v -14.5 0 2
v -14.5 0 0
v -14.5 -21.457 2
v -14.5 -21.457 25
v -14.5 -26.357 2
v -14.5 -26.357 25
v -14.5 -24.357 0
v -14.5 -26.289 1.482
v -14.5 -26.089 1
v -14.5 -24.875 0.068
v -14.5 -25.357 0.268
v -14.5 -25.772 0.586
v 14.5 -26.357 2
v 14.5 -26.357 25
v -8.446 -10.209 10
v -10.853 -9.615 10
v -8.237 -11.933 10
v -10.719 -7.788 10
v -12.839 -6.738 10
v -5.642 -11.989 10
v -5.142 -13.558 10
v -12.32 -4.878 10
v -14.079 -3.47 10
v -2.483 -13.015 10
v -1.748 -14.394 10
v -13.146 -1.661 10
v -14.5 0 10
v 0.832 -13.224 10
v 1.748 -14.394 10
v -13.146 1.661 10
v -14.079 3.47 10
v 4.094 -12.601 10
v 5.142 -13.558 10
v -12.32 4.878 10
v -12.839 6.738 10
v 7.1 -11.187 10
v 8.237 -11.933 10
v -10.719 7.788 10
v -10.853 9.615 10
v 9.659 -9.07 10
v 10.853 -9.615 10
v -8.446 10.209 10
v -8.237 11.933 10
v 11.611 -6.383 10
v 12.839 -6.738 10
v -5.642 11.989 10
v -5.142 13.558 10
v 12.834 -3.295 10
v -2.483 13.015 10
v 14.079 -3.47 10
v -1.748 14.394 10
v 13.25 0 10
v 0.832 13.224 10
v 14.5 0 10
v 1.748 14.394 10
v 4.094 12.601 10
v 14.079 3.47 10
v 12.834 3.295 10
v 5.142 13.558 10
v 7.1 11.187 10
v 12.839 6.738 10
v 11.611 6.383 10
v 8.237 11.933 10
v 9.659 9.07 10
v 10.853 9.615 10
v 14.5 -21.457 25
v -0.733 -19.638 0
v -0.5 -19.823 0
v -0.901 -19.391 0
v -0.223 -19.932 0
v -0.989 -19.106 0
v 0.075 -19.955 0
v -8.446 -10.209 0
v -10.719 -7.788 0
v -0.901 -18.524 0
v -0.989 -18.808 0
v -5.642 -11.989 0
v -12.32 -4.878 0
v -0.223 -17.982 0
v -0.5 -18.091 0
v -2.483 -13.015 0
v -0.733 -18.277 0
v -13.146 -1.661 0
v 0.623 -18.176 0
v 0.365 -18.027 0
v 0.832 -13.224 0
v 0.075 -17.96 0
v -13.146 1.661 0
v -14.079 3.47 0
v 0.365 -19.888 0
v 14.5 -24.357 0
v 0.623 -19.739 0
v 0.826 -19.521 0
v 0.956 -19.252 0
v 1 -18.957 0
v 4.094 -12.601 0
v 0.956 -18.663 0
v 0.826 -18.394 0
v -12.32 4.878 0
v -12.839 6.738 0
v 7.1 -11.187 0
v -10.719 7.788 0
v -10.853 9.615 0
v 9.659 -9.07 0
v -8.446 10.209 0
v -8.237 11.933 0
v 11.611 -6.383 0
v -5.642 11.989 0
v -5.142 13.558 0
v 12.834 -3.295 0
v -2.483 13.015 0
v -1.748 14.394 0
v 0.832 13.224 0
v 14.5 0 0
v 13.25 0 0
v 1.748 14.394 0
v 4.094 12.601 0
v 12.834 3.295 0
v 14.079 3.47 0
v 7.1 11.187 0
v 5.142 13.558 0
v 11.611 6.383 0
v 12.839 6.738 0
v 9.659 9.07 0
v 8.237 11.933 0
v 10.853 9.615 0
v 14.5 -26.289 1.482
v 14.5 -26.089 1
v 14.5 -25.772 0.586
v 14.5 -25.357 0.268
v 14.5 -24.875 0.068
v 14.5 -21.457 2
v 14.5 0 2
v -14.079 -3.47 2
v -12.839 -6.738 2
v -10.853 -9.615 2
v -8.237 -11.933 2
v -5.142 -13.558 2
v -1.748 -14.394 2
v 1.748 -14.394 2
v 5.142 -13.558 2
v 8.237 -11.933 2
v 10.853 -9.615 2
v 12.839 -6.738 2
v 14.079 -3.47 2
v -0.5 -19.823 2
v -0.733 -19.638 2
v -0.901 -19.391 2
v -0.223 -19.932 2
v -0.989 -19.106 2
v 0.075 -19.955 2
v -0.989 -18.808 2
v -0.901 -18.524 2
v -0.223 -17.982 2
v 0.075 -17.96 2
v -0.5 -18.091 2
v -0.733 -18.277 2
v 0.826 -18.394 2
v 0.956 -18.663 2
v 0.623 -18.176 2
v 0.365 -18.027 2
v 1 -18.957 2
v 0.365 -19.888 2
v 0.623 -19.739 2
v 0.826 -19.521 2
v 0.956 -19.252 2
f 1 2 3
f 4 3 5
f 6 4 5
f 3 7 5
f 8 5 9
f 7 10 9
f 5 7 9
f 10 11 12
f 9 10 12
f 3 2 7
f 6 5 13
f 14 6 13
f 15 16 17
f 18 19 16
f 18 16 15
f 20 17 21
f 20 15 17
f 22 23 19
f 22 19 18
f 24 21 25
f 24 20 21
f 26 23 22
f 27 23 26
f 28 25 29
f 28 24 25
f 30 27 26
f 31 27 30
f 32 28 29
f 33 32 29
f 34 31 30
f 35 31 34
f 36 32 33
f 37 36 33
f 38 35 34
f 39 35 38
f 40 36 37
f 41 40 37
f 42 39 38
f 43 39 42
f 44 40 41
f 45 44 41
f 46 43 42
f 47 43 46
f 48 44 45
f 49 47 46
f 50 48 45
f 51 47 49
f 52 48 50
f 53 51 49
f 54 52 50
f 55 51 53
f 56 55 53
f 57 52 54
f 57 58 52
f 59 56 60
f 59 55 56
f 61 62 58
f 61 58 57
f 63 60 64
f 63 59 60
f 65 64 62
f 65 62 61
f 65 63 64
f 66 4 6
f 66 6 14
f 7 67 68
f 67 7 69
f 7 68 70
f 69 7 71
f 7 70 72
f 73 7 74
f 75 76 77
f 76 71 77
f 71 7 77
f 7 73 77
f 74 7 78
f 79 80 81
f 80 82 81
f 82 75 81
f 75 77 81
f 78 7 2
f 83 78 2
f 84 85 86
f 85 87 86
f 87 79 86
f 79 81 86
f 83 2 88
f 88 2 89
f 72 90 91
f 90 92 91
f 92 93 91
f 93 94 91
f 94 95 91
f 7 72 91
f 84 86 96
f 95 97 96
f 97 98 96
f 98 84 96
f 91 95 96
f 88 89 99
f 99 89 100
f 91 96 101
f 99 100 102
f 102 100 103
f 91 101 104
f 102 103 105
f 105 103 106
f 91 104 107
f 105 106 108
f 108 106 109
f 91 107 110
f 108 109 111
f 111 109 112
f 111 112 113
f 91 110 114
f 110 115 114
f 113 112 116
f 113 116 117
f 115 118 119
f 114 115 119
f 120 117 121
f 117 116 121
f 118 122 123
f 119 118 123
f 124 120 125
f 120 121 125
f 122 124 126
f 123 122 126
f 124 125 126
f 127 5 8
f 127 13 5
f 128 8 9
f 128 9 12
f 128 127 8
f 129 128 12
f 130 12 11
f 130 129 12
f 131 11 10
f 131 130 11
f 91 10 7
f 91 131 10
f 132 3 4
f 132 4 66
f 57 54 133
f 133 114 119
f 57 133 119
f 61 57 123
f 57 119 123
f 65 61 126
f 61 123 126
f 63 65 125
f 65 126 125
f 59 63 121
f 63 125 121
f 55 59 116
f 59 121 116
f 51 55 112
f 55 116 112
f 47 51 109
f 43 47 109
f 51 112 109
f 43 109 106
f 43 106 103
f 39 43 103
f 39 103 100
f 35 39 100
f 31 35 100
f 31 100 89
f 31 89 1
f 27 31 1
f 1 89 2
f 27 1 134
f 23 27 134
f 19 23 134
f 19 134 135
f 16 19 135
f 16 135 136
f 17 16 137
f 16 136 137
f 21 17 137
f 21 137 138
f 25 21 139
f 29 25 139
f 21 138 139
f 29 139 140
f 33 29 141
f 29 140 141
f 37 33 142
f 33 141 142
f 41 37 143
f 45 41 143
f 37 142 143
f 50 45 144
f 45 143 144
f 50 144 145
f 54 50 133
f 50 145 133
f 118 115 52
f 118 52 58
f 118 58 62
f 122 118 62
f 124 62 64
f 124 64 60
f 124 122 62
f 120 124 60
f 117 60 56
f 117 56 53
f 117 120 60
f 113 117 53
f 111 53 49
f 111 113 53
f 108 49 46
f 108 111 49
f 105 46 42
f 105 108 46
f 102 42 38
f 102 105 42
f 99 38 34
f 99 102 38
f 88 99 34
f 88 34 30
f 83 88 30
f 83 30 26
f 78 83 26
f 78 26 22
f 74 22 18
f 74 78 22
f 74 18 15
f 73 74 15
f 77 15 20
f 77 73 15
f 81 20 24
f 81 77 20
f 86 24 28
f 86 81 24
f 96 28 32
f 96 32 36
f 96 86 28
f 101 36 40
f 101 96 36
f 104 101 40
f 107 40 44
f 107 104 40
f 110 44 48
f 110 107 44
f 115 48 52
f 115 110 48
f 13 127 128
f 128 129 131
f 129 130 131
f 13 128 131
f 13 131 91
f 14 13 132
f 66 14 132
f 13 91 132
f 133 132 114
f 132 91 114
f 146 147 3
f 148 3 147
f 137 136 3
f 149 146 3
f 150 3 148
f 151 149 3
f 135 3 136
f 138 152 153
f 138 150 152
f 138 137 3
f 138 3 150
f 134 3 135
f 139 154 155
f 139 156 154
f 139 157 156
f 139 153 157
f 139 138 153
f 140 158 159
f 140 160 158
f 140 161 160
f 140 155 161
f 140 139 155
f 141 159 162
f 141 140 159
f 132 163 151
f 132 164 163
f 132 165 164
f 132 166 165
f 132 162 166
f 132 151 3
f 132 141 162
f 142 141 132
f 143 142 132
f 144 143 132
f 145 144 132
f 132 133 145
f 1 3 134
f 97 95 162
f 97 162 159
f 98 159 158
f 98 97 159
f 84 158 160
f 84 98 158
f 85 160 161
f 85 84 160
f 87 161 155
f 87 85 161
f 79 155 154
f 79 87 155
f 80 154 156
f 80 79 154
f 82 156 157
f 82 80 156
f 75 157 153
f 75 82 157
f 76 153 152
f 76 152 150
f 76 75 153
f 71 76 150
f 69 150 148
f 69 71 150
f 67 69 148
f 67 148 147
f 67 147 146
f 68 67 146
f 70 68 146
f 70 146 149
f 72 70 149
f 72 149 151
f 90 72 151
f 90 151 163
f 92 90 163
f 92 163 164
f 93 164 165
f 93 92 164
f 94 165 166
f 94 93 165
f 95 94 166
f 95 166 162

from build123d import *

# Parameters (mm, degrees)
F0_R     = 13.25
F1_DEPTH = 10
F0_R_2   = 1
F0_W     = 29
F0_H     = 4.9
F2_DEPTH = 2
F3_DEPTH = 25
F4_R     = 2


with BuildPart() as f1:
    # F0 (on Top) → F1 (new body)
    with BuildSketch(Plane.XY):
        with BuildLine():
            ThreePointArc((-14.5, 0), (0, -14.5), (14.5, 0))
            ThreePointArc((14.5, 0), (0, 14.5), (-14.5, 0))
        make_face()
        Circle(F0_R, mode=Mode.SUBTRACT)
    extrude(amount=F1_DEPTH)

    # F0 (on Top) → F2 (join)
    with BuildSketch(Plane.XY):
        with BuildLine():
            Line((14.5, -21.457395), (14.5, 0))
            ThreePointArc((14.5, 0), (0, -14.5), (-14.5, 0))
            Line((-14.5, 0), (-14.5, -21.457395))
            Line((-14.5, -21.457395), (14.5, -21.457395))
        make_face()
        with Locations((0, -18.957395)):
            Circle(F0_R_2, mode=Mode.SUBTRACT)
        with Locations((0, -23.907395)):
            Rectangle(F0_W, F0_H)
    extrude(amount=F2_DEPTH)

    # F0 (on Top) → F3 (join)
    with BuildSketch(Plane.XY):
        with Locations((0, -23.907395)):
            Rectangle(F0_W, F0_H)
    extrude(amount=F3_DEPTH)

    # F4
    f4_edges = [f1.edges().sort_by_distance(p)[0] for p in [
        (0, -26.357395, 0),
    ]]
    fillet(f4_edges, radius=F4_R)


solid = f1.part
